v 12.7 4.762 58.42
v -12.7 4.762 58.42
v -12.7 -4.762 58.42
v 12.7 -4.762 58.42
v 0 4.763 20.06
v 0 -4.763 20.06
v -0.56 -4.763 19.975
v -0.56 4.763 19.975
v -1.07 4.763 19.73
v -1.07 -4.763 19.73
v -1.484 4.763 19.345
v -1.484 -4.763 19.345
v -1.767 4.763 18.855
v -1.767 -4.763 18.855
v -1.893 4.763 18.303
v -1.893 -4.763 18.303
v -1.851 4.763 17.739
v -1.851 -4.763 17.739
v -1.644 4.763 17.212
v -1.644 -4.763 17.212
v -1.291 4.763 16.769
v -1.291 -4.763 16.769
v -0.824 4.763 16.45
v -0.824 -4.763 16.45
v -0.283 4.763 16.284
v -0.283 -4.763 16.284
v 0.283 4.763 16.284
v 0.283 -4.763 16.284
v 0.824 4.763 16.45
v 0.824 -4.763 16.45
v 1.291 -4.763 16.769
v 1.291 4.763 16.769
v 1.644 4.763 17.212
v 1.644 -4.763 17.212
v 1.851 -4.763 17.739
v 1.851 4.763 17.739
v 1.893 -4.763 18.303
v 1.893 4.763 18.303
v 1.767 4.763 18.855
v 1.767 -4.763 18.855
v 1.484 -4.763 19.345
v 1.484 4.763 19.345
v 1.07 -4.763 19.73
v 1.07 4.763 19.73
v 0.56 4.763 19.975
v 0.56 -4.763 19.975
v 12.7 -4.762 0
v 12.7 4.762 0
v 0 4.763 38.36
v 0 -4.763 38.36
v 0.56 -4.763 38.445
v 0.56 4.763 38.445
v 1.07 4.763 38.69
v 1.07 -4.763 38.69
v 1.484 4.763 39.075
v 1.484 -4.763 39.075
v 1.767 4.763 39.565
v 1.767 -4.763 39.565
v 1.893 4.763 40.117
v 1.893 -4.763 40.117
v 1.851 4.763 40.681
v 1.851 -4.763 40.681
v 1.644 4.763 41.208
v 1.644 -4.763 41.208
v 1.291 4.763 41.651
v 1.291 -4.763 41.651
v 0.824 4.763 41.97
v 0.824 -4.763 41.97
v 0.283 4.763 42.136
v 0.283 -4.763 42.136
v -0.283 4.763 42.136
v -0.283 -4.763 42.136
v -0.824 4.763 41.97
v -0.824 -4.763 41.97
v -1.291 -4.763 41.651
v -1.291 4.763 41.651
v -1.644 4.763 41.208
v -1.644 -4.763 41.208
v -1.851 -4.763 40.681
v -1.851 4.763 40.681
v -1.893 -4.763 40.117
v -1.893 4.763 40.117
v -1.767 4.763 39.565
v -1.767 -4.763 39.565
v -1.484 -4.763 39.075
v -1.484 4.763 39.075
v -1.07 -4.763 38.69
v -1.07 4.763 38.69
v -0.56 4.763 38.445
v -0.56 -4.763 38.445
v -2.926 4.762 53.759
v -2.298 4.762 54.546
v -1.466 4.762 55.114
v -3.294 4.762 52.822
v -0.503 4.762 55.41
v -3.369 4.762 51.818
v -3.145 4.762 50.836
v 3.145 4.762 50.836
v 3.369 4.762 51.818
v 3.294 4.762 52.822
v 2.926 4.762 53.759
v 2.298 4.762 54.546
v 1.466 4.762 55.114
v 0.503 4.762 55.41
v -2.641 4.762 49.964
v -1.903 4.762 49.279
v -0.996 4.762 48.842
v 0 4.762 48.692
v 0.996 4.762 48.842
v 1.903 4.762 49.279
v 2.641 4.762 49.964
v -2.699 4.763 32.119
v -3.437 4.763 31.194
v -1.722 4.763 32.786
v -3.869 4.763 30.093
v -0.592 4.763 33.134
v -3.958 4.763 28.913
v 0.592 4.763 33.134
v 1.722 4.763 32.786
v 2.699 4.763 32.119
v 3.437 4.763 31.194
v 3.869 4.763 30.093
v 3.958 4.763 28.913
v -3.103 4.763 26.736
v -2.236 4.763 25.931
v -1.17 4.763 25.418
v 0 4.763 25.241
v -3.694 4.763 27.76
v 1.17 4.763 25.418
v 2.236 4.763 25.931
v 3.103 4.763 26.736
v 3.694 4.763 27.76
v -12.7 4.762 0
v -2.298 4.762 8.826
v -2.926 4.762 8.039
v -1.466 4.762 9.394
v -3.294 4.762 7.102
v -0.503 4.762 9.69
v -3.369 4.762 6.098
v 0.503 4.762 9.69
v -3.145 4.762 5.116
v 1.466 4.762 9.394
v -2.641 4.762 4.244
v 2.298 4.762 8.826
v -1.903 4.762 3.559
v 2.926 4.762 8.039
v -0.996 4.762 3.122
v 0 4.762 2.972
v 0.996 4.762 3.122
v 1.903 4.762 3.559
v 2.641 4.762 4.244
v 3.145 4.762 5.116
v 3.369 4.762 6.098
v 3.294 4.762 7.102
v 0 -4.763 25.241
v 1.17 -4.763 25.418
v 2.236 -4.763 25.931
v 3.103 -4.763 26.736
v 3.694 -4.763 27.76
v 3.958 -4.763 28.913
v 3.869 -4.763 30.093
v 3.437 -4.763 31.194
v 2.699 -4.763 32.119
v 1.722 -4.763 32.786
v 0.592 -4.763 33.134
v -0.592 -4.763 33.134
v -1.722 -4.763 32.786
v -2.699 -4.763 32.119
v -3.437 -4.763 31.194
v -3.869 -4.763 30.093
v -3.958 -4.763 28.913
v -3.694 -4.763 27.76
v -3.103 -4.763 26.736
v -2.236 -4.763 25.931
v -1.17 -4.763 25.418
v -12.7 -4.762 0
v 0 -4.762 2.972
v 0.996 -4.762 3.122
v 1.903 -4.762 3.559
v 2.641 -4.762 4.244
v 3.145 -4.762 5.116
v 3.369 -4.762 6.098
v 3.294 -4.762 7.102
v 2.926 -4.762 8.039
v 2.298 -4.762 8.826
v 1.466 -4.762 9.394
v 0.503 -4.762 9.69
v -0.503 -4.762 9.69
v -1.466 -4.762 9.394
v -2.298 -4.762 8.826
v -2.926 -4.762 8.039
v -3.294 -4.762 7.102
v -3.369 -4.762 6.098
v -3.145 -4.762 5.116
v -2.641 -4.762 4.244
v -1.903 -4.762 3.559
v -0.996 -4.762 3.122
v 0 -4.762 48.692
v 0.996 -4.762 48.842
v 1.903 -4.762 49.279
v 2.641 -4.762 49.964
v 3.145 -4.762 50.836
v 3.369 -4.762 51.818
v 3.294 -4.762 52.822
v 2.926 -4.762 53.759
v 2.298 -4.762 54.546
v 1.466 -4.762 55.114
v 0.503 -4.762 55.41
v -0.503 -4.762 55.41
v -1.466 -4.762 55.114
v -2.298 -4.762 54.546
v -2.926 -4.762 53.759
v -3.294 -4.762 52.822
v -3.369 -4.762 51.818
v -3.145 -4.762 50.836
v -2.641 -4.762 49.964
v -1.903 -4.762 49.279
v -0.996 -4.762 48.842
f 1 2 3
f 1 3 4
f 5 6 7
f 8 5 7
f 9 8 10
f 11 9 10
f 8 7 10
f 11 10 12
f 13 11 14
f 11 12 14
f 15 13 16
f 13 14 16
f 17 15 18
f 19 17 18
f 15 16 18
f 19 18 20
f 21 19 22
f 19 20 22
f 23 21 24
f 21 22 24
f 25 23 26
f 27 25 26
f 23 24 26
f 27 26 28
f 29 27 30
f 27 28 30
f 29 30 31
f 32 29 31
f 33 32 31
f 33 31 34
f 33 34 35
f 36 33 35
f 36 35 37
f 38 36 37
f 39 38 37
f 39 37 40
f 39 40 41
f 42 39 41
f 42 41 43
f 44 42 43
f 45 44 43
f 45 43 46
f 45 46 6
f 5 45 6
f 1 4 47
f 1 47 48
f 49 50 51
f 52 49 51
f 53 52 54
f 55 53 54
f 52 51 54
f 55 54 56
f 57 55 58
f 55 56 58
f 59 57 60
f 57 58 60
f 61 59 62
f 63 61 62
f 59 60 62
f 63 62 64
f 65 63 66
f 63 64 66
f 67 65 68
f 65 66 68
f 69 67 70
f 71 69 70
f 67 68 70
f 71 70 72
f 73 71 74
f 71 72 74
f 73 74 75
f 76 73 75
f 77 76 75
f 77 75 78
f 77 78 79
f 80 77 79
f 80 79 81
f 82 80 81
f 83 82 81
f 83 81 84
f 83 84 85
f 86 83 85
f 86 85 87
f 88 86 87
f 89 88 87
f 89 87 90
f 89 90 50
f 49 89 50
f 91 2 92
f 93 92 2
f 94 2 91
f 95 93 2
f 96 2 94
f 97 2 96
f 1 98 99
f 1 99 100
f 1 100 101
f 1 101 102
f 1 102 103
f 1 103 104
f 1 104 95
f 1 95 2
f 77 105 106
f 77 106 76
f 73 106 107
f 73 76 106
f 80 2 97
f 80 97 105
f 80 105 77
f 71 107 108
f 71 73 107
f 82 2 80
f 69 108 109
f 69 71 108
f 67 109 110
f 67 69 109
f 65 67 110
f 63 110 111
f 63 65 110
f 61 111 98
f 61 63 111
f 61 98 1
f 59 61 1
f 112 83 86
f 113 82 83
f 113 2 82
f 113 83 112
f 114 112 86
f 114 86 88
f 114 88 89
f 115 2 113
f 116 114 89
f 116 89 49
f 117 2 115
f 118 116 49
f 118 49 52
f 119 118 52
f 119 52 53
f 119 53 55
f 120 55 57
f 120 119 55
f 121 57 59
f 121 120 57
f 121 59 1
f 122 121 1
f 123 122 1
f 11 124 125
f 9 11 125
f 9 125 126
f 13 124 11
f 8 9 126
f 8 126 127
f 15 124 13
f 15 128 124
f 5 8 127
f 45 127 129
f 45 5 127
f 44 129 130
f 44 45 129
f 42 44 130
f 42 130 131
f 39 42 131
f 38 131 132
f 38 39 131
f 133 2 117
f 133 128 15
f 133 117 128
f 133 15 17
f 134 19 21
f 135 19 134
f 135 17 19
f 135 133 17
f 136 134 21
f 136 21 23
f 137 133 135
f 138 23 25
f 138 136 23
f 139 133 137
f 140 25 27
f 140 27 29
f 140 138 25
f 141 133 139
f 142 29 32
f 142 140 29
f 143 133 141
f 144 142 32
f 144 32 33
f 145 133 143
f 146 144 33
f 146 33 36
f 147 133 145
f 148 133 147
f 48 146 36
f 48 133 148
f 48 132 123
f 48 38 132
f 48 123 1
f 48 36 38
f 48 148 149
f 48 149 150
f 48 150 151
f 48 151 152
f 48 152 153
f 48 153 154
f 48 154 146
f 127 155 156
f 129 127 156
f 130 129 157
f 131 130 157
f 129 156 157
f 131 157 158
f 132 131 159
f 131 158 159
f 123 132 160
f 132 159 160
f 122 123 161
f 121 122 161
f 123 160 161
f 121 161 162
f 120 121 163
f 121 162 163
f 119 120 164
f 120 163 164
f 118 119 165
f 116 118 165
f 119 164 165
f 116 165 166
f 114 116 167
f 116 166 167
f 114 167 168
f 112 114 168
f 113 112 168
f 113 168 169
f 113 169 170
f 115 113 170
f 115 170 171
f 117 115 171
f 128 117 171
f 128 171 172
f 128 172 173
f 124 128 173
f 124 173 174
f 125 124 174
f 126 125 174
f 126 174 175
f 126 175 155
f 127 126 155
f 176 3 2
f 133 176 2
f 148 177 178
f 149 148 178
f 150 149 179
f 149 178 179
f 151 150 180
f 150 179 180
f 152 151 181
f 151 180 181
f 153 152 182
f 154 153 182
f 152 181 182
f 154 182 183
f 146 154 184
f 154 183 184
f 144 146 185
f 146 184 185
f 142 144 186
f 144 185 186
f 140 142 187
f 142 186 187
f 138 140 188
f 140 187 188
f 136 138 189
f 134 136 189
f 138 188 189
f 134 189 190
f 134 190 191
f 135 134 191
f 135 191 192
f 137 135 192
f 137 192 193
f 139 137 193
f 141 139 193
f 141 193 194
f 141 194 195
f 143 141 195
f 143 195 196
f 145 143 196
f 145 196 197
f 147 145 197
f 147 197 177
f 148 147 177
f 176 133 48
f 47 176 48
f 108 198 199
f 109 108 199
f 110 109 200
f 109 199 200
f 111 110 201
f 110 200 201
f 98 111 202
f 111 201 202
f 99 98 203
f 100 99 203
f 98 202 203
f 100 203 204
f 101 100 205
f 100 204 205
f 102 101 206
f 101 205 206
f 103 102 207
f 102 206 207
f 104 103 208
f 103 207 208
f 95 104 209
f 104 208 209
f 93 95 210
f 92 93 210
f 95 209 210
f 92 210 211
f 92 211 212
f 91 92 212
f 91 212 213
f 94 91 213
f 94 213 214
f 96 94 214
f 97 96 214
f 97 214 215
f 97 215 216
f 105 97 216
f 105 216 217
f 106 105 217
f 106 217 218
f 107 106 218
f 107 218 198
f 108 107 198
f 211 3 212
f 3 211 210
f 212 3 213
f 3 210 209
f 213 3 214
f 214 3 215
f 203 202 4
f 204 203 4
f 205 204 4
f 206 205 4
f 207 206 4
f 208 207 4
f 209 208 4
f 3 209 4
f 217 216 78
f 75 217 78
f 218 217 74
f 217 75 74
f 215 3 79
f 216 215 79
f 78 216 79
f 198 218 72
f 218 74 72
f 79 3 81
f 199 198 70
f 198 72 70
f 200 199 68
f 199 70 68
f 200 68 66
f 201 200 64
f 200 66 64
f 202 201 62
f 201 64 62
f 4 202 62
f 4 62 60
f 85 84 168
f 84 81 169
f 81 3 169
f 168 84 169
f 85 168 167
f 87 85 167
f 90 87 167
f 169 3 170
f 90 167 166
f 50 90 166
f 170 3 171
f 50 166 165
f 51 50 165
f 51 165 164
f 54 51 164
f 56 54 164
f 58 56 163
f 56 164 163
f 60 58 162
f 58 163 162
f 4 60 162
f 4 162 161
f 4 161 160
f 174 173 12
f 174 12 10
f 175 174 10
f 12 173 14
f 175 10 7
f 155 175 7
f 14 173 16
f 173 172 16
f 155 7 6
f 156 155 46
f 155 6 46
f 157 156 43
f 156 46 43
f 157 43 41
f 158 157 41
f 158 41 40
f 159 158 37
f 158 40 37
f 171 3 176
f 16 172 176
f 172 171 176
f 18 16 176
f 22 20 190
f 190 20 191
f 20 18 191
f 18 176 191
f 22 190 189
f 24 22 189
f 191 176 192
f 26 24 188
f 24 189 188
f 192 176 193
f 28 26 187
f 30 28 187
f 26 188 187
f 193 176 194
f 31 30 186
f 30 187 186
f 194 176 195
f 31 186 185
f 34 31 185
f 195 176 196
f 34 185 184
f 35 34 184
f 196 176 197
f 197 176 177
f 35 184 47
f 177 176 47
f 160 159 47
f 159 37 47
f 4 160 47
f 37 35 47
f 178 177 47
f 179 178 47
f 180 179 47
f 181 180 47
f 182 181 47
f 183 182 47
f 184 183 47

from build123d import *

# Parameters (mm, degrees)
SKETCH1_W                   = 25.4
SKETCH1_H                   = 9.525
EXTRUDE1_DEPTH              = 58.42
F_1_4_CLEARANCE_HOLE1_D     = 6.7564
F_1_4_CLEARANCE_HOLE1_DEPTH = 12.7
F_1_4_CLEARANCE_HOLE1_TIP   = 2.029827343
F_3_8_16_TAPPED_HOLE1_D     = 7.9375
F_10_24_TAPPED_HOLE1_D      = 3.7973
CIRPATTERN1_COUNT           = 2


with BuildPart() as part:
    # Sketch1 → Extrude1 (new body)
    with BuildSketch(Plane.XY):
        Rectangle(SKETCH1_W, SKETCH1_H)
    extrude(amount=EXTRUDE1_DEPTH)

    # 1/4 Clearance Hole1
    with Locations(Plane(origin=(0, 4.7625, 6.35), x_dir=(0, 0, 1), z_dir=(0, 1, 0))):
        with Locations((0, 0), (45.72, 0)):
            Hole(F_1_4_CLEARANCE_HOLE1_D / 2, depth=F_1_4_CLEARANCE_HOLE1_DEPTH)
            with Locations((0, 0, -(F_1_4_CLEARANCE_HOLE1_DEPTH + F_1_4_CLEARANCE_HOLE1_TIP / 2))):  # 118° drill point
                Cone(0, F_1_4_CLEARANCE_HOLE1_D / 2, F_1_4_CLEARANCE_HOLE1_TIP, mode=Mode.SUBTRACT)

    # 3/8-16 Tapped Hole1 (through all)
    with Locations(Plane(origin=(0, 4.7625, 29.21), x_dir=(0, 0, 1), z_dir=(0, 1, 0))):
        with Locations((0, 0)):
            Hole(F_3_8_16_TAPPED_HOLE1_D / 2)

    # #10-24 Tapped Hole1 (through all)
    with Locations(Plane(origin=(0, 4.7625, 40.259), x_dir=(0, 0, 1), z_dir=(0, 1, 0))):
        with Locations((0, 0)):
            f_10_24_tapped_hole1 = Hole(F_10_24_TAPPED_HOLE1_D / 2)

    # CirPattern1: #10-24 Tapped Hole1 ×2 about axis
    cirpattern1_axis = Axis((0, 0, 29.21), (0, 1, 0))
    for i in range(1, CIRPATTERN1_COUNT):
        add(f_10_24_tapped_hole1.rotate(cirpattern1_axis, i * 360 / CIRPATTERN1_COUNT), mode=Mode.SUBTRACT)


solid = part.part
